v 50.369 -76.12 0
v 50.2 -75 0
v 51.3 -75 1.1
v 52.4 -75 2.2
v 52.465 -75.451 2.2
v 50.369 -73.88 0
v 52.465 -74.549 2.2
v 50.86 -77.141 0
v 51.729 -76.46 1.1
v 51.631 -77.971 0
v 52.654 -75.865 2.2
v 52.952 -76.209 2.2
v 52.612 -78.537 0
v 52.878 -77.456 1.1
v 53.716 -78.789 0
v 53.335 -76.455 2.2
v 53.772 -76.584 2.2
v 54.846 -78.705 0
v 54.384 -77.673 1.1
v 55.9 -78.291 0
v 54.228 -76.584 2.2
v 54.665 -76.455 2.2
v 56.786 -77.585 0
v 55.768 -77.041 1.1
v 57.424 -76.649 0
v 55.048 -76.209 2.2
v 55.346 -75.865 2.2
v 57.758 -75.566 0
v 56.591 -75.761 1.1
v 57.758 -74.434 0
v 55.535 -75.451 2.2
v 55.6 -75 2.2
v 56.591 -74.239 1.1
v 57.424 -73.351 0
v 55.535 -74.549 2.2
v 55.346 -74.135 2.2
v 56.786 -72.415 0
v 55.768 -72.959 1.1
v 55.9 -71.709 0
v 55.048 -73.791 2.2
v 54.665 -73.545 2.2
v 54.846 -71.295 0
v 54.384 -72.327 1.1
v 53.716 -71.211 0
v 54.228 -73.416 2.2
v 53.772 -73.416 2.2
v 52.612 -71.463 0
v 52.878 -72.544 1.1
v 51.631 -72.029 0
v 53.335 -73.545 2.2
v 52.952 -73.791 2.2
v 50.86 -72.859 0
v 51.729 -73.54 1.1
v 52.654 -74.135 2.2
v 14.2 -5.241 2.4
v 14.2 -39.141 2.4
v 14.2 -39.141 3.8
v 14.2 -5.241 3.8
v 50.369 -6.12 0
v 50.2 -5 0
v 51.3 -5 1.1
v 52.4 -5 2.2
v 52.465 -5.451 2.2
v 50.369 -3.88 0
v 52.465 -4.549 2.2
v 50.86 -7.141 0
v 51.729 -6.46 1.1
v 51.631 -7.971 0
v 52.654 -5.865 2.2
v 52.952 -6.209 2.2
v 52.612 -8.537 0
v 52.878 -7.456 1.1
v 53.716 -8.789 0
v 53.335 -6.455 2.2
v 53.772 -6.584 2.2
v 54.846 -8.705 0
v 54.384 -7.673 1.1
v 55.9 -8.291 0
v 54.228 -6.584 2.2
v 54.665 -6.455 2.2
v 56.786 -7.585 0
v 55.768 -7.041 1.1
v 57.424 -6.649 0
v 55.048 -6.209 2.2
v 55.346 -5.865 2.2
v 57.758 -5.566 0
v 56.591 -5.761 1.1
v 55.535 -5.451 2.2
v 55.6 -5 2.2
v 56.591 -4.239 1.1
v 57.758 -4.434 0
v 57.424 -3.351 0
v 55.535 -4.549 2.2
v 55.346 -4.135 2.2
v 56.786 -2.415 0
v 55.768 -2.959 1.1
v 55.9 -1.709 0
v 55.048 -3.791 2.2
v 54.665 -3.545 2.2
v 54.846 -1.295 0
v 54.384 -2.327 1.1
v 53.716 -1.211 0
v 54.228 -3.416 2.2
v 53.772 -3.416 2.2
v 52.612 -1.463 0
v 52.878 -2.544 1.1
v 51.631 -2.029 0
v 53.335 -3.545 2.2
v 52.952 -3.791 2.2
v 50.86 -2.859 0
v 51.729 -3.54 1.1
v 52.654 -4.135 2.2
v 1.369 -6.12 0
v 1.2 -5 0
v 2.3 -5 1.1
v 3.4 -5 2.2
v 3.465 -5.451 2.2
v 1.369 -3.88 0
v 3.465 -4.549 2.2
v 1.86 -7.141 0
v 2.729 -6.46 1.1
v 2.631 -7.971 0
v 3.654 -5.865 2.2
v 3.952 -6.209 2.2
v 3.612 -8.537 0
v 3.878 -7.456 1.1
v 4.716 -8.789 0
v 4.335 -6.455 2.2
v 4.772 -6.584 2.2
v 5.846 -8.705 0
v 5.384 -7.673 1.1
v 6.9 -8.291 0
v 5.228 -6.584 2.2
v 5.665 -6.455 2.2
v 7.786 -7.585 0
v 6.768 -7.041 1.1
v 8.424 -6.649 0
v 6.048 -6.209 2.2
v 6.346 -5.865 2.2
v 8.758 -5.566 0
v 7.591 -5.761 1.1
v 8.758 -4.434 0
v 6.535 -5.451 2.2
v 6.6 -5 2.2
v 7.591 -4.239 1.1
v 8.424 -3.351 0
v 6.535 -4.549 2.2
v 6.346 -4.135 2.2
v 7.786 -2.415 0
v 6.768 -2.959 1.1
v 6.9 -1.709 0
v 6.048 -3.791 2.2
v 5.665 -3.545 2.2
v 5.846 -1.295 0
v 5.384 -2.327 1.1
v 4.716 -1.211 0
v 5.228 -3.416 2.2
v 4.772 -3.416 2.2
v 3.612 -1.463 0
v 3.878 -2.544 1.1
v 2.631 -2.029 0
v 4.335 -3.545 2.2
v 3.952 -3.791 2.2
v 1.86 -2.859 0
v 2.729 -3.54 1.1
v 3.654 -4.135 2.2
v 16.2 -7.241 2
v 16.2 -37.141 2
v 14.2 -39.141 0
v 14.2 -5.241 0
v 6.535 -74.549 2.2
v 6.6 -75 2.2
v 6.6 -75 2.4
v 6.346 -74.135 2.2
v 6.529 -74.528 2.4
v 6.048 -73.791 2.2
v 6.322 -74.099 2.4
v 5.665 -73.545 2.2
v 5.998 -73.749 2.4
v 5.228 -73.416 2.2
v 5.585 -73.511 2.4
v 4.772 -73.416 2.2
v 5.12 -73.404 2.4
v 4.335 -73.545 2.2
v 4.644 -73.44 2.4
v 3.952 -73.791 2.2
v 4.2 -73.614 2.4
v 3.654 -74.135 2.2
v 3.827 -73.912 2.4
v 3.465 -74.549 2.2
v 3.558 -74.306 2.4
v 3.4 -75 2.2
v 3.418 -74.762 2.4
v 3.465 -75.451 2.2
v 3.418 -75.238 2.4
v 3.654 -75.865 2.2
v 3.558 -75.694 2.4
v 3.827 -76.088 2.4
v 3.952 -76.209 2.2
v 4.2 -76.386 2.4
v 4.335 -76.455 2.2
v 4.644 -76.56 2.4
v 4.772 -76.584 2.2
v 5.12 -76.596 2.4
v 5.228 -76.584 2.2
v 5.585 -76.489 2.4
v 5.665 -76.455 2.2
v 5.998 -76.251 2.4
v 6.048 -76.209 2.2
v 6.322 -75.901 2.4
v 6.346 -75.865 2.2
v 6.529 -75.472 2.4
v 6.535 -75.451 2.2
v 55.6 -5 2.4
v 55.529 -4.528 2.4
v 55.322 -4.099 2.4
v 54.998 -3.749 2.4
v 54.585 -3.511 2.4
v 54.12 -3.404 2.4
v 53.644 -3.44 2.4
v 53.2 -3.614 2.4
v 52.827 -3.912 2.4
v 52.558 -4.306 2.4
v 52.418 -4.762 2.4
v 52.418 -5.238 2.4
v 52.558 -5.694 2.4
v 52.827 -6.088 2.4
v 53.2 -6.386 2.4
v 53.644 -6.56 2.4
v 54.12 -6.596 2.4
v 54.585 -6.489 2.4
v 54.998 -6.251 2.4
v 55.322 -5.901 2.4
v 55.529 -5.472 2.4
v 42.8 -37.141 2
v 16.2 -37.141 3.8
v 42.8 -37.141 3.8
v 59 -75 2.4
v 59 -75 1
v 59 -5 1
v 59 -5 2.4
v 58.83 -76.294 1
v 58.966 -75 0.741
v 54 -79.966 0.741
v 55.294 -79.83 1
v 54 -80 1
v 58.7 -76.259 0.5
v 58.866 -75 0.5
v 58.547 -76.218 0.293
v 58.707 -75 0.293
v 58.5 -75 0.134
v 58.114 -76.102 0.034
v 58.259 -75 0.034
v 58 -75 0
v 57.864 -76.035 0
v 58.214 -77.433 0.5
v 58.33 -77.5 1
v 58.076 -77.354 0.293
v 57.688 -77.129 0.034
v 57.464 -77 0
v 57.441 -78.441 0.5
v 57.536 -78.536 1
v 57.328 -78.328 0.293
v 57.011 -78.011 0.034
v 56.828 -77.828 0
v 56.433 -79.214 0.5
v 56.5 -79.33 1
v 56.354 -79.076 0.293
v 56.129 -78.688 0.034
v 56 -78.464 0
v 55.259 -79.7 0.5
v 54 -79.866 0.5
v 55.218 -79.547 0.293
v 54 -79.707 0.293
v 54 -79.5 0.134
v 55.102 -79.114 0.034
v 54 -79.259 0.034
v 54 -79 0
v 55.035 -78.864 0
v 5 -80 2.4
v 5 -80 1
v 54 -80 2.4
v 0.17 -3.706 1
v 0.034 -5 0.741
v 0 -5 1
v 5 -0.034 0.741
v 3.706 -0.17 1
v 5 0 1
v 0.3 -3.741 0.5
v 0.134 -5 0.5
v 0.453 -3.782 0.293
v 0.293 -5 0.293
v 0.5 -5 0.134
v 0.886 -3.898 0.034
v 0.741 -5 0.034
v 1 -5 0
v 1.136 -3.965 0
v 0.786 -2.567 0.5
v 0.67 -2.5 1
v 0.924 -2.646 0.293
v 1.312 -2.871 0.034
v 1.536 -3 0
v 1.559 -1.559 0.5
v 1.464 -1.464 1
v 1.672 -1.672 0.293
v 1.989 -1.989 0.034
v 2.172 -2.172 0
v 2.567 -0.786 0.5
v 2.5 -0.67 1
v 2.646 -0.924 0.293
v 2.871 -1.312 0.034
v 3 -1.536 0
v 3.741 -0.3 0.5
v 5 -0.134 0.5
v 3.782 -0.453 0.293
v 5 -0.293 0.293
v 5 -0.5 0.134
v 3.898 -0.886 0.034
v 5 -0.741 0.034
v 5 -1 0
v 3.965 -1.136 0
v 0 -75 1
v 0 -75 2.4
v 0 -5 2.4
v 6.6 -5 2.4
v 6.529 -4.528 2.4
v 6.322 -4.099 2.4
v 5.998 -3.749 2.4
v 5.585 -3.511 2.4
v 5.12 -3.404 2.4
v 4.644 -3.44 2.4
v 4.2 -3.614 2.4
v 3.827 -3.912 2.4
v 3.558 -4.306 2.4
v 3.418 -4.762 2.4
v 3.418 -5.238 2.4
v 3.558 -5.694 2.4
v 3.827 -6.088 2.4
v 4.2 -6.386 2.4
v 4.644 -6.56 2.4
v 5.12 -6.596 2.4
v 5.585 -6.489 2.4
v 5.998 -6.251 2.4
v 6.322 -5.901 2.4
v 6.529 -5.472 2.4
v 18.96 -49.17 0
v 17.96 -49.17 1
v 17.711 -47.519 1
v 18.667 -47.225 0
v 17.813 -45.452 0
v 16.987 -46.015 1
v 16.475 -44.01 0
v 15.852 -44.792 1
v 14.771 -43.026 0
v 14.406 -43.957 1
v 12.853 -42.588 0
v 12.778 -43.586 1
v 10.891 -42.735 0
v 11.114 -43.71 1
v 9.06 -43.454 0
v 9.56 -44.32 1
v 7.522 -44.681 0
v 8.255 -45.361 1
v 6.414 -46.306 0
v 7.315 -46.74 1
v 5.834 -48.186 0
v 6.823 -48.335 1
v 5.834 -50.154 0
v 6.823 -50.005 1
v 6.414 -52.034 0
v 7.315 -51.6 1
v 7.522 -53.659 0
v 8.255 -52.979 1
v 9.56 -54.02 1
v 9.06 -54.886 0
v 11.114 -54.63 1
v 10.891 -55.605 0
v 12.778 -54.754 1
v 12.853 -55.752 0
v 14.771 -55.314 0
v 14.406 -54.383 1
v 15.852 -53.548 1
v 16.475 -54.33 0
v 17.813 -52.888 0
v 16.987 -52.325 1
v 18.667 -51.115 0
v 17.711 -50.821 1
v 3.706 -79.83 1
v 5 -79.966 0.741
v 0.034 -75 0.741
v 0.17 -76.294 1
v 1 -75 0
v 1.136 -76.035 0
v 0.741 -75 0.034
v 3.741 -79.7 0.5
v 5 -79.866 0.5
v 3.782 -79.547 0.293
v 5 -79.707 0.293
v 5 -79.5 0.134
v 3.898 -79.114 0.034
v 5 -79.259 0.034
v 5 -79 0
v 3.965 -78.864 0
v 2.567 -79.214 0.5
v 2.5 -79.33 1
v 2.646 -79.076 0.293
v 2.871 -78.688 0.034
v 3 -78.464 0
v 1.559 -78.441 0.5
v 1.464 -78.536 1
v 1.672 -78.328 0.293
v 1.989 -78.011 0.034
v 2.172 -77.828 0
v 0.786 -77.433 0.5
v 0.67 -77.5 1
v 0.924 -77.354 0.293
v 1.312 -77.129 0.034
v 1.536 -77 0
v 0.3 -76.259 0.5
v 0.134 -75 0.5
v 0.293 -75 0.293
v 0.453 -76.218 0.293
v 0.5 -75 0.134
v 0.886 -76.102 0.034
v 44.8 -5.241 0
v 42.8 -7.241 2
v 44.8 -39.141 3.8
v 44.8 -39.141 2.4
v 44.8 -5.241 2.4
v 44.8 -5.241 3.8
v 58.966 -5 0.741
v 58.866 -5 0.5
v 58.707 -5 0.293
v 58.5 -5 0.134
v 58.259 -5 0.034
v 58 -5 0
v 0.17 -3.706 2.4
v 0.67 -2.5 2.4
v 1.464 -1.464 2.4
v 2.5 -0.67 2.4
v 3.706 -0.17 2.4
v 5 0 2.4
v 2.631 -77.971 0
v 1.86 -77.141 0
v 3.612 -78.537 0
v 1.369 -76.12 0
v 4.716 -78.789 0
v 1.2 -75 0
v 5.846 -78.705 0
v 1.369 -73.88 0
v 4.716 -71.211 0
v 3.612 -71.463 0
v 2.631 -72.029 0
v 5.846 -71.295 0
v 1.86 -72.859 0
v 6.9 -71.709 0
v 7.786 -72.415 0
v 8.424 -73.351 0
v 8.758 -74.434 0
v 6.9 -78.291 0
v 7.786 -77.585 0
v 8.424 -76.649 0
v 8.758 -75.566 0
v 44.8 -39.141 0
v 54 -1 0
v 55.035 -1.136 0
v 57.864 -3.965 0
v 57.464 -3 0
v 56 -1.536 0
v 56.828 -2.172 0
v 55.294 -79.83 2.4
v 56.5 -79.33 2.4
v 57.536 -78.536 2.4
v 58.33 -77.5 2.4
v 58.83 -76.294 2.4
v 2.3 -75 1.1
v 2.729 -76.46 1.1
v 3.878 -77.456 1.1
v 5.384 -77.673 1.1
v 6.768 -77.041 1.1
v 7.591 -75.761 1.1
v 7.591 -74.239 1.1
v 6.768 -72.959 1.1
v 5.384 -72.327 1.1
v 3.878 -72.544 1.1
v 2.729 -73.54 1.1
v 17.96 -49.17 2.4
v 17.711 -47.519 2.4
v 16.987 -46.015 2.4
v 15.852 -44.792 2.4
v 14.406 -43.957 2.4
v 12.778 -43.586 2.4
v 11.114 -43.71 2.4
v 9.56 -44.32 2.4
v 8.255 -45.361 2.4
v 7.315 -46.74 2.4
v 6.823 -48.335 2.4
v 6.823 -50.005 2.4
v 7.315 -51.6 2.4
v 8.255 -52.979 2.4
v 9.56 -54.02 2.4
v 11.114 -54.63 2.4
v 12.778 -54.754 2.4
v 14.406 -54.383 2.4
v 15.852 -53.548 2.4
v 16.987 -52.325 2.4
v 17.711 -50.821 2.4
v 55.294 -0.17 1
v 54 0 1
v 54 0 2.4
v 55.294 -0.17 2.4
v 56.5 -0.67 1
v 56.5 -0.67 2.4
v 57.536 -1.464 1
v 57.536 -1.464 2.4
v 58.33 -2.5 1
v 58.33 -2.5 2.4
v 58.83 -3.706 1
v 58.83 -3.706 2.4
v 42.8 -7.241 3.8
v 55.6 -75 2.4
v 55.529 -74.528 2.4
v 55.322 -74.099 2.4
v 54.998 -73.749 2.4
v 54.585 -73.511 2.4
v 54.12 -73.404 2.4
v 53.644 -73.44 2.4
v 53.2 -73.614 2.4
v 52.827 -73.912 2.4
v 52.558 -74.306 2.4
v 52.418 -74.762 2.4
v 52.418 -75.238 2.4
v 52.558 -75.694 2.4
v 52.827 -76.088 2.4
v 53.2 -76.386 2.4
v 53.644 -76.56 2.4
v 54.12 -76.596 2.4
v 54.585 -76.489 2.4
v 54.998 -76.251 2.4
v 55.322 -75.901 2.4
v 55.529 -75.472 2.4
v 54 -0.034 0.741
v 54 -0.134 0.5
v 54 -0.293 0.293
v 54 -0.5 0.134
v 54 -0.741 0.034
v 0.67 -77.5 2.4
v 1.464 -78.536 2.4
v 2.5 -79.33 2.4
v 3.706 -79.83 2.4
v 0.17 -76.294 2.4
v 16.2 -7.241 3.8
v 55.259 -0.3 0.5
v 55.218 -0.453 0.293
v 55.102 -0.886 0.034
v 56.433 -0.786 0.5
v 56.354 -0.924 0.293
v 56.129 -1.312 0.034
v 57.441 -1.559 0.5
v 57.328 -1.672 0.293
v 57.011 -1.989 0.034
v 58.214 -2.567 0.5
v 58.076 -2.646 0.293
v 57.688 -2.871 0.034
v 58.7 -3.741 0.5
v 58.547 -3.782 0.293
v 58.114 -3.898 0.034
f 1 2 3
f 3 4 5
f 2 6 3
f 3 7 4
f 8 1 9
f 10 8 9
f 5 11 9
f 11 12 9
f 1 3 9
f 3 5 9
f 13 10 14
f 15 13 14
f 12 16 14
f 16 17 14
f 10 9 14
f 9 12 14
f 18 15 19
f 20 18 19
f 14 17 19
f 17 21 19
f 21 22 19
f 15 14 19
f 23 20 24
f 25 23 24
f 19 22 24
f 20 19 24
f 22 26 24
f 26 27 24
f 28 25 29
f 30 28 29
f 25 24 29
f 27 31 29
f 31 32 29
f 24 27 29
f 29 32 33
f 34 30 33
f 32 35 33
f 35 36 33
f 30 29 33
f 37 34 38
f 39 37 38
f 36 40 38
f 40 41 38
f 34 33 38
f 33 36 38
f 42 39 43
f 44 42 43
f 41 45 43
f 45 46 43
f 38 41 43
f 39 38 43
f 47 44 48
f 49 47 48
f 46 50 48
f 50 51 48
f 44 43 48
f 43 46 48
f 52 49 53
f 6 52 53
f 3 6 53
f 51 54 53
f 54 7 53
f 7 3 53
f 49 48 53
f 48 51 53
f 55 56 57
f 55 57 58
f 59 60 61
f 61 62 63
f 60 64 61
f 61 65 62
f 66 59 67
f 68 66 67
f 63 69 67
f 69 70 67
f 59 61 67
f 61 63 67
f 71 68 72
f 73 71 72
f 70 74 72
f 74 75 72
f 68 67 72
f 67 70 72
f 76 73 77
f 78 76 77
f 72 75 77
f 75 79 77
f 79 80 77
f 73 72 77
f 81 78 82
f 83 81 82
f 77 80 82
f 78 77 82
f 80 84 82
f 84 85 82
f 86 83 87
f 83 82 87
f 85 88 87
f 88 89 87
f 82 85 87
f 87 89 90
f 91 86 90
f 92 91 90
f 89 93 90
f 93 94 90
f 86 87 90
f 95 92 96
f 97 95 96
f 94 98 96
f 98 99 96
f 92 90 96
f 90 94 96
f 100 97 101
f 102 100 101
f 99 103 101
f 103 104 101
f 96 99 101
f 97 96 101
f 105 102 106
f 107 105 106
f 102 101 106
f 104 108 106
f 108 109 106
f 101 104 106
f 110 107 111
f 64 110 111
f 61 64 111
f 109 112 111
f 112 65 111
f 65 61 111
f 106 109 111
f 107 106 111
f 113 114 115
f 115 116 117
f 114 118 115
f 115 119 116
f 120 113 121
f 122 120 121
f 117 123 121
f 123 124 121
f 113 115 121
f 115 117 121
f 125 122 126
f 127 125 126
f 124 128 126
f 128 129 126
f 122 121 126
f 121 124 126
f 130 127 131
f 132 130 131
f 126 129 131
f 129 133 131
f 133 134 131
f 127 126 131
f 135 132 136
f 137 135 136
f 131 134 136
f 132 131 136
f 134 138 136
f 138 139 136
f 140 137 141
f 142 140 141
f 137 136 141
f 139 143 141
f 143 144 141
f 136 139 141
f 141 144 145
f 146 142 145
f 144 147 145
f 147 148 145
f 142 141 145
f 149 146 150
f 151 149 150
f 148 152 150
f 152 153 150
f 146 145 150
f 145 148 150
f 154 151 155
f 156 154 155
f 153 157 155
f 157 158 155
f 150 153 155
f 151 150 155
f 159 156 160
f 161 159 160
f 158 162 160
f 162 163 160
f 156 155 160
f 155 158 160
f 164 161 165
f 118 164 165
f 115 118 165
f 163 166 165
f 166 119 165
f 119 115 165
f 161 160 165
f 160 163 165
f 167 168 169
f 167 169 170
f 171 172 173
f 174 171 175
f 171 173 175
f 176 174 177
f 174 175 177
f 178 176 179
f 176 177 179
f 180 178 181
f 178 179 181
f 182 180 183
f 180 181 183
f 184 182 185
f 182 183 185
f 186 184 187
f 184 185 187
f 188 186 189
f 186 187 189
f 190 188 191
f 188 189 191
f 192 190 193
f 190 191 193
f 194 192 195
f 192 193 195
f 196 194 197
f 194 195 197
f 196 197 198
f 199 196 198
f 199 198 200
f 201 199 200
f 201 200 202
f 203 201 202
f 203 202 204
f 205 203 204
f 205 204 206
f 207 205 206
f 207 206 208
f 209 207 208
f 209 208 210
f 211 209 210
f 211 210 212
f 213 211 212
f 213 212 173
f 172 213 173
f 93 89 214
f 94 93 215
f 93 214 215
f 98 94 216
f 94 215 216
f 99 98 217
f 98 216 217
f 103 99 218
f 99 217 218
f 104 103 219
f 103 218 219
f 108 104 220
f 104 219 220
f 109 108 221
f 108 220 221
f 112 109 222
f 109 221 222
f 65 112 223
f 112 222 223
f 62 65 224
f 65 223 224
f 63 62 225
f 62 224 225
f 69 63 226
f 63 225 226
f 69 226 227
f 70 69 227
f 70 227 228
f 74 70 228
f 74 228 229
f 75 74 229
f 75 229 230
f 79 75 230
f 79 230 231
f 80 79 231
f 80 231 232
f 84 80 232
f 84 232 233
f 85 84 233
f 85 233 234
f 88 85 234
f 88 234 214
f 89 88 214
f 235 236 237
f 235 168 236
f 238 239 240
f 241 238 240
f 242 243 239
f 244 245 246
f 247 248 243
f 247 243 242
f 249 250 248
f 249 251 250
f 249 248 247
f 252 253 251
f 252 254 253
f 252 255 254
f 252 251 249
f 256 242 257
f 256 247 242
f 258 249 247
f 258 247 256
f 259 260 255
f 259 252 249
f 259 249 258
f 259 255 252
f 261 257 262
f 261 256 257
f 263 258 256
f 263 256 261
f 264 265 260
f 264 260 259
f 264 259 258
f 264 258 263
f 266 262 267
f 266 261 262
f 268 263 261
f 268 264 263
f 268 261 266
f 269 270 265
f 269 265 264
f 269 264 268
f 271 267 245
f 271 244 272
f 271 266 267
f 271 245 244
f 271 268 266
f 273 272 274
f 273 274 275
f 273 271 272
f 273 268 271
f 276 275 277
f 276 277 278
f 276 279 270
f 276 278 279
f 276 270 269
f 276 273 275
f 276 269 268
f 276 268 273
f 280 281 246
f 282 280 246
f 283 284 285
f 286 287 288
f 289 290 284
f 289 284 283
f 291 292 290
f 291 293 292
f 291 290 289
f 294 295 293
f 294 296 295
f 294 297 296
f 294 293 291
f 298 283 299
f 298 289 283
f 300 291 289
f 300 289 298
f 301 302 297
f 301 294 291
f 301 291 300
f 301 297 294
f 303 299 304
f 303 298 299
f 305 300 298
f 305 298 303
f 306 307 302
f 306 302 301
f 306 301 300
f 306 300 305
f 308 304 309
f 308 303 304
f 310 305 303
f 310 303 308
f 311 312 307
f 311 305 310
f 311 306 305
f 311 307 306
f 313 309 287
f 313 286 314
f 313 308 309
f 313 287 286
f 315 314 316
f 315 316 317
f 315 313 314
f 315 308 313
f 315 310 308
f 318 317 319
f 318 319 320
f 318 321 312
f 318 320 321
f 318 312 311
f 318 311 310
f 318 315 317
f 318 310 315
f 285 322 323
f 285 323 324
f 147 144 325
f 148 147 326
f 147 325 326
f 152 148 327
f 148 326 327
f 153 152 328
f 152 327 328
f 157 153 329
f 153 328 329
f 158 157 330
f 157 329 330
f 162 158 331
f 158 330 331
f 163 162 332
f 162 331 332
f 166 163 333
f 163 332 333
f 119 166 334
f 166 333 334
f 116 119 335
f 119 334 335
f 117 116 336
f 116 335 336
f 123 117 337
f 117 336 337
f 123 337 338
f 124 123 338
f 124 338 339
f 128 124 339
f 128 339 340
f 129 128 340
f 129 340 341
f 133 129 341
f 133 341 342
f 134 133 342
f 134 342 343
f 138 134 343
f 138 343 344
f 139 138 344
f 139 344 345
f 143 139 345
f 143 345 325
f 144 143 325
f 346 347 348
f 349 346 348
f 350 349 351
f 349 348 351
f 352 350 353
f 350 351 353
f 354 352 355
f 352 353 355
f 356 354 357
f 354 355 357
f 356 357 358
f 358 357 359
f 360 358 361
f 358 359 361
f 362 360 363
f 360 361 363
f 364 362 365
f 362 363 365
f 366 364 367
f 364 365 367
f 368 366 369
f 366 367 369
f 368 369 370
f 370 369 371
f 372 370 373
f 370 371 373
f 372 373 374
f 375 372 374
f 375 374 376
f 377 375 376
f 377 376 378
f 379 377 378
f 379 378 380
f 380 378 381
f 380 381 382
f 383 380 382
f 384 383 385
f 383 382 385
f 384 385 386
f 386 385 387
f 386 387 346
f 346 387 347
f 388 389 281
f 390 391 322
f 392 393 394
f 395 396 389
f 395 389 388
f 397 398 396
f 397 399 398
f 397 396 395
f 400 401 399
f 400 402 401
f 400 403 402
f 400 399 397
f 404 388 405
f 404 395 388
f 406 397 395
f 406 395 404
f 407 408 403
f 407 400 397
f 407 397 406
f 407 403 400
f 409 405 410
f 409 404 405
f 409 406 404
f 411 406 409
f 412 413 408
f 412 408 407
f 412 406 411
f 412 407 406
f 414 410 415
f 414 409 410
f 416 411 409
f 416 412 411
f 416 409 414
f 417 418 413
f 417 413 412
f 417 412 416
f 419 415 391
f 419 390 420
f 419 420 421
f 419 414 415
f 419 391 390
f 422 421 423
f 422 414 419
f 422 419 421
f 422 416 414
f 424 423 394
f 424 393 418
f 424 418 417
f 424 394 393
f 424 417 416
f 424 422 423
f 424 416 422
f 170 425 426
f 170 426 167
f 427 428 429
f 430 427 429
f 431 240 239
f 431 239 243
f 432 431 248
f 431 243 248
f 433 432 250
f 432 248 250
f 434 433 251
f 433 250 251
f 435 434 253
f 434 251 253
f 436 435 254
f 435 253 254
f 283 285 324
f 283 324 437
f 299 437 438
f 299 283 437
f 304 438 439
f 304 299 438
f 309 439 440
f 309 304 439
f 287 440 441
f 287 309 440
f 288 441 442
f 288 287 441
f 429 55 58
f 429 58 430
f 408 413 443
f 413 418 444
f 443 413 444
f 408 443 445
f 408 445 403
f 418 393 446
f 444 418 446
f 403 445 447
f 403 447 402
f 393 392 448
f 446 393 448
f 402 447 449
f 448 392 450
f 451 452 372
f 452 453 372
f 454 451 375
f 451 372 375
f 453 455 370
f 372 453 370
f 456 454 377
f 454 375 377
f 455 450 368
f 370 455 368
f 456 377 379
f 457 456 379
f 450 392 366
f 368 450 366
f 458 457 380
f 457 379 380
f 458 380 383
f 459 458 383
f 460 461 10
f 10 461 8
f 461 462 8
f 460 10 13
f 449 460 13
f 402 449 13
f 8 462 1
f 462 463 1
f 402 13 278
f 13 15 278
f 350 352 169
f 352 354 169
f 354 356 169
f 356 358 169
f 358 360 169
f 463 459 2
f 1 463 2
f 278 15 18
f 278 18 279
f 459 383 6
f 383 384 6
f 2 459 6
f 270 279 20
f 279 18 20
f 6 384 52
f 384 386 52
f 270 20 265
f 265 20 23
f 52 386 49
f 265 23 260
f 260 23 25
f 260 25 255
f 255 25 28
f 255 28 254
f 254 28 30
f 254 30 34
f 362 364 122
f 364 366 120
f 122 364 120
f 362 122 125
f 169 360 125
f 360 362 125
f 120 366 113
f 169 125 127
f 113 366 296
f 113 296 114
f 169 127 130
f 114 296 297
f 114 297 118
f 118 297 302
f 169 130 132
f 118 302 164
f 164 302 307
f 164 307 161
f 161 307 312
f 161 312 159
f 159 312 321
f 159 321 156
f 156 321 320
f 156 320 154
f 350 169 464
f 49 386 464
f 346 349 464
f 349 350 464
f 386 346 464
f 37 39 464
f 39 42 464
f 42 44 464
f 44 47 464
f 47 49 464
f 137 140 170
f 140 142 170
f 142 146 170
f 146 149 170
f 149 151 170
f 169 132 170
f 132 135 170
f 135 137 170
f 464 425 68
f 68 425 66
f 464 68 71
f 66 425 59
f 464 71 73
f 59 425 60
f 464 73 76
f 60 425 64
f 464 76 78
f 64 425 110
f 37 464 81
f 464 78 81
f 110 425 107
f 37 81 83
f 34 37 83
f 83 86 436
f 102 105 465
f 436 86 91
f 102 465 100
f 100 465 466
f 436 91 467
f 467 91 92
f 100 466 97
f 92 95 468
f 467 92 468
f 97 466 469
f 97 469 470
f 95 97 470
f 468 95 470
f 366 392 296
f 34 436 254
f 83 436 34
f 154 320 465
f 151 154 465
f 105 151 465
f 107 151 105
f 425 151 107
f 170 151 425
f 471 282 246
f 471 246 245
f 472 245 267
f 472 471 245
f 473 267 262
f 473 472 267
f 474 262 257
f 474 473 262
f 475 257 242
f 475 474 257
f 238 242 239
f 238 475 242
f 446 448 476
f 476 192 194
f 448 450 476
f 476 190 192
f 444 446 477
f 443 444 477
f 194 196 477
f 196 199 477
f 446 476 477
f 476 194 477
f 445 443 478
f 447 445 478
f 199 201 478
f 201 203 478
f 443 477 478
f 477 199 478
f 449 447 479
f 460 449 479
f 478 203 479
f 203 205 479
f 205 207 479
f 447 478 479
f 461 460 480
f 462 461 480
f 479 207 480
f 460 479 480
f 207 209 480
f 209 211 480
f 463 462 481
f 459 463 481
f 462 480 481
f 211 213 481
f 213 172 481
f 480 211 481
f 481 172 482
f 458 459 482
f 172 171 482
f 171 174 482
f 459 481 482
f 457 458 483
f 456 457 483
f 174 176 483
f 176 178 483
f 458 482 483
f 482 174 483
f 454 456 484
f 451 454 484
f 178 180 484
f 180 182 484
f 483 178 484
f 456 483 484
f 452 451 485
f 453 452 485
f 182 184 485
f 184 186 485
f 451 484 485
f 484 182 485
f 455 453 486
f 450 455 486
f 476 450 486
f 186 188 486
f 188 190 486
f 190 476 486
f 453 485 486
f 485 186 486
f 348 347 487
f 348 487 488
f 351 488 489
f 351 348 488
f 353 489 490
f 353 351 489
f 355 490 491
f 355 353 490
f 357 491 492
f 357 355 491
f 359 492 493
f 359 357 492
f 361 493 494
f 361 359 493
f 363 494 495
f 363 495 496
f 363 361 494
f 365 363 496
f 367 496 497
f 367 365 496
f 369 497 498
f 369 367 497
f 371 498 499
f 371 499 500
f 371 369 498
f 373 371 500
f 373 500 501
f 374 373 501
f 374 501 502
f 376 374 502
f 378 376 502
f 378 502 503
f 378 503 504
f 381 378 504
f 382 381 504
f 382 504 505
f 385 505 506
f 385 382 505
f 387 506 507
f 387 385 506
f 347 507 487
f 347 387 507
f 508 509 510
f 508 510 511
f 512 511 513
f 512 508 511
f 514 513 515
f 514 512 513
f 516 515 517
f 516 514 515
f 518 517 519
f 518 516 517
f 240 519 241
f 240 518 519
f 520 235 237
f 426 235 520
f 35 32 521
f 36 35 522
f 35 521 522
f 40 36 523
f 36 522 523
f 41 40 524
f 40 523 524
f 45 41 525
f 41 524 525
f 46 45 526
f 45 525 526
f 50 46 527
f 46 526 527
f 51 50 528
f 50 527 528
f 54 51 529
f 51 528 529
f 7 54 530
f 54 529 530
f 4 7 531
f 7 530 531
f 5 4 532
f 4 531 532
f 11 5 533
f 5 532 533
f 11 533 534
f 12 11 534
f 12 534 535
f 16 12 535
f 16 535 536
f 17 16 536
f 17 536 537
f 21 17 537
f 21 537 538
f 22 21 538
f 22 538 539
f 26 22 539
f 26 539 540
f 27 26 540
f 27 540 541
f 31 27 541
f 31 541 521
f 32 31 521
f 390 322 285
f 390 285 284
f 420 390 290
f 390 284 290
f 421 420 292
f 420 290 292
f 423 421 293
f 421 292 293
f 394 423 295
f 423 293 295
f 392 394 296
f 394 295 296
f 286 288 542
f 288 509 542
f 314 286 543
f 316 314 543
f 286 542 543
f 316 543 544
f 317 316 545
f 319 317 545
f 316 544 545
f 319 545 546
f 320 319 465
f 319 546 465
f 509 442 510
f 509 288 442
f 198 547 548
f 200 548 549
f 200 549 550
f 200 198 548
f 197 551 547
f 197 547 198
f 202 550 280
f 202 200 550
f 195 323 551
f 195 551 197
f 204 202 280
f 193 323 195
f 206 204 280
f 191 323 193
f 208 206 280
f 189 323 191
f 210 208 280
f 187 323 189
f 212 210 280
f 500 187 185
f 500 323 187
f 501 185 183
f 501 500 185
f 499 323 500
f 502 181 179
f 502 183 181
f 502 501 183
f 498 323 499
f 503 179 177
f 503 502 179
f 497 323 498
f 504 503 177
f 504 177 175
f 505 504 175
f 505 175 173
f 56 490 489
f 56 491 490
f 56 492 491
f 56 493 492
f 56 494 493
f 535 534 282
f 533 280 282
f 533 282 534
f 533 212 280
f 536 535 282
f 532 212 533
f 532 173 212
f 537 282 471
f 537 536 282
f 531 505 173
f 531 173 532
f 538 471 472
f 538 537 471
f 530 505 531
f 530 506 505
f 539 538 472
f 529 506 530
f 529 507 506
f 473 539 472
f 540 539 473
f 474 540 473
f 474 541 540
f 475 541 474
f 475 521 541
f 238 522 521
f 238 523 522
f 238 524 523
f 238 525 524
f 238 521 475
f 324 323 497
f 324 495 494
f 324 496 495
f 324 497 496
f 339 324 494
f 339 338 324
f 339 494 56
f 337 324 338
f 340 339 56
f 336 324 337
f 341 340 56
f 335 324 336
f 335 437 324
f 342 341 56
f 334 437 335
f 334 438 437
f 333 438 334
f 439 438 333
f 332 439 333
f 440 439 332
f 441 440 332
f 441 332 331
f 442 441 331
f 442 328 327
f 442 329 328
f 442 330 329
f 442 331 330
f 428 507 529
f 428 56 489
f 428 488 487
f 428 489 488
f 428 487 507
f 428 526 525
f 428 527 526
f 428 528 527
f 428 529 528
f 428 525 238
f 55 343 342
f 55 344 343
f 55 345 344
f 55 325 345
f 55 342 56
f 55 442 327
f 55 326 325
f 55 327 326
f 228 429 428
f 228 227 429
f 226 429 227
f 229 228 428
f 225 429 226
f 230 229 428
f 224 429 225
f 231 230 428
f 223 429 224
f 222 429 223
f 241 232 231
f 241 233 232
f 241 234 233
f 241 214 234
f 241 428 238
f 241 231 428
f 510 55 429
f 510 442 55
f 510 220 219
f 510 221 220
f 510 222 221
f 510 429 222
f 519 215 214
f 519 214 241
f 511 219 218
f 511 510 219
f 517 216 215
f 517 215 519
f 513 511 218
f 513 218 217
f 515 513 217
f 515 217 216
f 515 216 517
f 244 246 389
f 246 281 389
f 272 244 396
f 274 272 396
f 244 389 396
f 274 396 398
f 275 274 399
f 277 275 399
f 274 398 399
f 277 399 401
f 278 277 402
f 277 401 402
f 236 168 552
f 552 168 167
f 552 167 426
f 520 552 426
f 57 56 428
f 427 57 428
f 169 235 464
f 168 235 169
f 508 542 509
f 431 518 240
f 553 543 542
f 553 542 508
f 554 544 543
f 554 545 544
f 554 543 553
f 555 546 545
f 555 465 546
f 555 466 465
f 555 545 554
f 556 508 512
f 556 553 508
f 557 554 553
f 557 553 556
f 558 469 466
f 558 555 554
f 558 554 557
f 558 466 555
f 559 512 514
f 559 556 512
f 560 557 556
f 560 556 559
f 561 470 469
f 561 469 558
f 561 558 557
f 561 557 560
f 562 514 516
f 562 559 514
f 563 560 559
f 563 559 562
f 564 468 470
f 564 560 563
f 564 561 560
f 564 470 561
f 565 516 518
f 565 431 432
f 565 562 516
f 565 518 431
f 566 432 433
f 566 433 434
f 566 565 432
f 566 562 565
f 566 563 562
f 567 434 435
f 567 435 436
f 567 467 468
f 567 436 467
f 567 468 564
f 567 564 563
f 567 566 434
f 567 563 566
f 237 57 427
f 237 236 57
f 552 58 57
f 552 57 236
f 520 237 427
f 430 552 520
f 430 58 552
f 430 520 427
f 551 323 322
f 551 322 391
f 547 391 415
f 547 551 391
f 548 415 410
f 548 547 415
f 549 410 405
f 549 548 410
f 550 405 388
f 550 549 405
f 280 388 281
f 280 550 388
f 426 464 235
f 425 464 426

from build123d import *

# Parameters (mm, degrees)
SKETCH_1_W           = 59
SKETCH_1_H           = 80
SKETCH_1_R           = 5.6
EXTRUDE_1_DEPTH      = 2.4
SKETCH_4_W           = 59
SKETCH_4_H           = 80
EXTRUDE_6_DEPTH      = 5.5
FILLET_1_R           = 5
FILLET_2_R           = 5
SKETCH_14_R          = 3
SKETCH_14_R_2        = 1.3
EXTRUDE_7_DEPTH      = 6.5
EXTRUDE_10_DEPTH     = 1
FILLET_3_R           = 1
CUT_EXTRUDE_1_DEPTH  = 10
SKETCH_23_W          = 26.6
SKETCH_23_H          = 29.9
CUT_EXTRUDE_4_DEPTH  = 52
SKETCH_24_W          = 26.6
SKETCH_24_H          = 5
EXTRUDE_11_DEPTH     = 0.2
SKETCH_25_W          = 26.6
SKETCH_25_H          = 5
EXTRUDE_12_DEPTH     = 0.2
SKETCH_26_R          = 3.14740537
SKETCH_26_R_2        = 1.3
EXTRUDE_13_DEPTH     = 6.5
CUT_EXTRUDE_5_DEPTH  = 0.6
CHAMFER_1_SIZE       = 2
CHAMFER_2_SIZE       = 1
EXTRUDE_16_DEPTH     = 6.5
EXTRUDE_16_2_DEPTH   = 6.5
EXTRUDE_16_3_DEPTH   = 6.5
EXTRUDE_16_4_DEPTH   = 6.5
EXTRUDE_16_5_DEPTH   = 6.5
EXTRUDE_16_6_DEPTH   = 6.5
EXTRUDE_17_REACH     = 101.616
SKETCH_34_R          = 1.3
CUT_EXTRUDE_7_DEPTH  = 10
SKETCH_33_W          = 70.771509838
SKETCH_33_H          = 90.701063175
CUT_EXTRUDE_6_DEPTH  = 10
CHAMFER_3_SIZE       = 2.5
SKETCH_35_W          = 30.6
SKETCH_35_H          = 33.9
SKETCH_35_W_2        = 26.6
SKETCH_35_H_2        = 29.9
EXTRUDE_18_DEPTH     = 1.4
SKETCH_37_R          = 1.6
CUT_EXTRUDE_11_DEPTH = 11.4


with BuildPart() as part:
    # Эскиз1 → Бобышка-Вытянуть1 (new body)
    with BuildSketch(Plane.XY):
        with Locations((29.5, -40)):
            Rectangle(SKETCH_1_W, SKETCH_1_H)
        with Locations((12.36, -49.17)):
            Circle(SKETCH_1_R, mode=Mode.SUBTRACT)
    extrude(amount=EXTRUDE_1_DEPTH)

    # Эскиз4 → Бобышка-Вытянуть6 (add)
    with BuildSketch(Plane.XY.offset(2.4)):
        with Locations((29.5, -40)):
            Rectangle(SKETCH_4_W, SKETCH_4_H)
        with BuildLine():
            Line((5.1, -2), (53.9, -2))
            ThreePointArc((53.9, -2), (56.092031022, -2.907968978), (57, -5.1))
            Line((57, -5.1), (57, -74.9))
            ThreePointArc((57, -74.9), (56.092031022, -77.092031022), (53.9, -78))
            Line((53.9, -78), (5.1, -78))
            ThreePointArc((5.1, -78), (2.907968978, -77.092031022), (2, -74.9))
            Line((2, -74.9), (2, -5.1))
            ThreePointArc((2, -5.1), (2.907968978, -2.907968978), (5.1, -2))
        make_face(mode=Mode.SUBTRACT)
    extrude(amount=EXTRUDE_6_DEPTH)

    # Скругление1
    fillet_1_edges = [part.edges().sort_by_distance(p)[0] for p in [
        (0, 0, 3.95),
    ]]
    fillet(fillet_1_edges, radius=FILLET_1_R)

    # Скругление2
    fillet_2_edges = [part.edges().sort_by_distance(p)[0] for p in [
        (59, 0, 3.95),
        (59, -80, 3.95),
        (0, -80, 3.95),
    ]]
    fillet(fillet_2_edges, radius=FILLET_2_R)

    # Эскиз14 → Бобышка-Вытянуть7 (add)
    # profile 1 of 4: a face of its own
    with BuildSketch(Plane.XY.offset(2.4)):
        with Locations(Location((5, -5, 0), (0, 0, 180.947144451))):
            Circle(SKETCH_14_R)
        with Locations(Location((5, -5, 0), (0, 0, 180))):
            Circle(SKETCH_14_R_2, mode=Mode.SUBTRACT)
    # profile 2 of 4: a face of its own
    with BuildSketch(Plane.XY.offset(2.4)):
        with Locations(Location((5, -75, 0), (0, 0, 179.052855549))):
            Circle(SKETCH_14_R)
        with Locations(Location((5, -75, 0), (0, 0, 180))):
            Circle(SKETCH_14_R_2, mode=Mode.SUBTRACT)
    # profile 3 of 4: a face of its own
    with BuildSketch(Plane.XY.offset(2.4)):
        with Locations(Location((54, -75, 0), (0, 0, 269.052855549))):
            Circle(SKETCH_14_R)
        with Locations(Location((54, -75, 0), (0, 0, 180))):
            Circle(SKETCH_14_R_2, mode=Mode.SUBTRACT)
    # profile 4 of 4: a face of its own
    with BuildSketch(Plane.XY.offset(2.4)):
        with Locations(Location((54, -5, 0), (0, 0, 90.947144451))):
            Circle(SKETCH_14_R)
        with Locations(Location((54, -5, 0), (0, 0, 180))):
            Circle(SKETCH_14_R_2, mode=Mode.SUBTRACT)
    extrude(amount=EXTRUDE_7_DEPTH)

    # Скругление3
    fillet_3_edges = [part.edges().sort_by_distance(p)[0] for p in [
        (0, -40, 0),
        (1.464466094, -1.464466094, 0),
        (29.5, -80, 0),
        (29.5, 0, 0),
        (59, -40, 0),
        (57.535533906, -1.464466094, 0),
        (57.535533906, -78.535533906, 0),
        (1.464466094, -78.535533906, 0),
    ]]
    fillet(fillet_3_edges, radius=FILLET_3_R)


with BuildPart() as body_2:
    # Эскиз15 → Бобышка-Вытянуть10 (new body)
    with BuildSketch(Plane.XY.offset(7.9)):
        with BuildLine():
            Line((5, 0), (54, 0))
            ThreePointArc((54, 0), (57.535533906, -1.464466094), (59, -5))
            Line((59, -5), (59, -75))
            ThreePointArc((59, -75), (57.535533906, -78.535533906), (54, -80))
            Line((54, -80), (5, -80))
            ThreePointArc((5, -80), (1.464466094, -78.535533906), (0, -75))
            Line((0, -75), (0, -5))
            ThreePointArc((0, -5), (1.464466094, -1.464466094), (5, 0))
        make_face()
        with BuildLine():
            Line((5, -1), (54, -1))
            ThreePointArc((54, -1), (56.828427125, -2.171572875), (58, -5))
            Line((58, -5), (58, -75))
            ThreePointArc((58, -75), (56.828427125, -77.828427125), (54, -79))
            Line((54, -79), (5, -79))
            ThreePointArc((5, -79), (2.171572875, -77.828427125), (1, -75))
            Line((1, -75), (1, -5))
            ThreePointArc((1, -5), (2.171572875, -2.171572875), (5, -1))
        make_face(mode=Mode.SUBTRACT)
    extrude(amount=EXTRUDE_10_DEPTH)


with BuildPart() as cut_extrude_1_tool:
    # Эскиз20 → Вырез-Вытянуть1 (new body)
    with BuildSketch(Plane(origin=(59, 0, 0), x_dir=(0, 0, -1), z_dir=(1, 0, 0))):
        with BuildLine():
            Line((-8.9, -11.15), (-5.2, -11.15))
            ThreePointArc((-5.2, -11.15), (-4.492893219, -11.442893219), (-4.2, -12.15))
            Line((-4.2, -12.15), (-4.2, -18.25))
            ThreePointArc((-4.2, -18.25), (-4.492893219, -18.957106781), (-5.2, -19.25))
            Line((-5.2, -19.25), (-8.9, -19.25))
            Line((-8.9, -19.25), (-8.9, -11.15))
        make_face()
    extrude(amount=-CUT_EXTRUDE_1_DEPTH)


with BuildPart() as part_1:
    add(part.part)

    # Вырез-Вытянуть1: cut by cut_extrude_1_tool
    add(cut_extrude_1_tool.part, mode=Mode.SUBTRACT)

    # Эскиз23 → Вырез-Вытянуть4 (cut)
    with BuildSketch(Plane(origin=(0, 0, 0), x_dir=(-1, 0, 0), z_dir=(0, 0, -1))):
        with Locations((-29.500023272, -22.190991649)):
            Rectangle(SKETCH_23_W, SKETCH_23_H)
    extrude(amount=-CUT_EXTRUDE_4_DEPTH, mode=Mode.SUBTRACT)

    # Эскиз24 → Бобышка-Вытянуть11 (add)
    with BuildSketch(Plane.XY.offset(2.4)):
        with Locations((29.500023272, -4.740991649)):
            Rectangle(SKETCH_24_W, SKETCH_24_H)
    extrude(amount=EXTRUDE_11_DEPTH)

    # Эскиз25 → Бобышка-Вытянуть12 (add)
    with BuildSketch(Plane.XY.offset(2.4)):
        with Locations((29.500023272, -39.640991649)):
            Rectangle(SKETCH_25_W, SKETCH_25_H)
    extrude(amount=EXTRUDE_12_DEPTH)


with BuildPart() as body_2_1:
    add(body_2.part)

    # Вырез-Вытянуть1: cut by cut_extrude_1_tool
    add(cut_extrude_1_tool.part, mode=Mode.SUBTRACT)


    add(part_1.part)  # Бобышка-Вытянуть13 merges part
    # Эскиз26 → Бобышка-Вытянуть13 (add)
    with BuildSketch(Plane.XY.offset(2.4)):
        with Locations(Location((46.9, -5.7, 0), (0, 0, 180))):
            Circle(SKETCH_26_R)
        with Locations(Location((46.9, -5.7, 0), (0, 0, 180))):
            Circle(SKETCH_26_R_2, mode=Mode.SUBTRACT)
    extrude(amount=EXTRUDE_13_DEPTH)

    # Эскиз27 → Вырез-Вытянуть5 (cut)
    with BuildSketch(Plane.XY.offset(7.9)):
        with BuildLine():
            Line((58, -75), (58, -19.25))
            Line((58, -19.25), (57, -19.25))
            Line((57, -19.25), (57, -74.9))
            ThreePointArc((57, -74.9), (56.999897526, -74.925205779), (56.999590109, -74.950409891))
            ThreePointArc((56.999590109, -74.950409891), (56.121320344, -77.121320344), (53.950409891, -77.999590109))
            ThreePointArc((53.950409891, -77.999590109), (53.925205779, -77.999897526), (53.9, -78))
            Line((53.9, -78), (5.1, -78))
            ThreePointArc((5.1, -78), (5.074794221, -77.999897526), (5.049590109, -77.999590109))
            ThreePointArc((5.049590109, -77.999590109), (2.878679656, -77.121320344), (2.000409891, -74.950409891))
            ThreePointArc((2.000409891, -74.950409891), (2.000102474, -74.925205779), (2, -74.9))
            Line((2, -74.9), (2, -5.1))
            ThreePointArc((2, -5.1), (2.000102474, -5.074794221), (2.000409891, -5.049590109))
            ThreePointArc((2.000409891, -5.049590109), (2.878679656, -2.878679656), (5.049590109, -2.000409891))
            ThreePointArc((5.049590109, -2.000409891), (5.074794221, -2.000102474), (5.1, -2))
            Line((5.1, -2), (53.9, -2))
            ThreePointArc((53.9, -2), (53.925205779, -2.000102474), (53.950409891, -2.000409891))
            ThreePointArc((53.950409891, -2.000409891), (56.121320344, -2.878679656), (56.999590109, -5.049590109))
            ThreePointArc((56.999590109, -5.049590109), (56.999897526, -5.074794221), (57, -5.1))
            Line((57, -5.1), (57, -11.15))
            Line((57, -11.15), (58, -11.15))
            Line((58, -11.15), (58, -5))
            ThreePointArc((58, -5), (56.828427125, -2.171572875), (54, -1))
            Line((54, -1), (5, -1))
            ThreePointArc((5, -1), (2.171572875, -2.171572875), (1, -5))
            Line((1, -5), (1, -75))
            ThreePointArc((1, -75), (2.171572875, -77.828427125), (5, -79))
            Line((5, -79), (54, -79))
            ThreePointArc((54, -79), (56.828427125, -77.828427125), (58, -75))
        make_face()
    extrude(amount=-CUT_EXTRUDE_5_DEPTH, mode=Mode.SUBTRACT)

    # Фаска1
    chamfer_1_edges = [body_2_1.edges().sort_by_distance(p)[0] for p in [
        (16.200023272, -22.190991649, 0),
        (29.500023272, -37.140991649, 0),
        (42.800023272, -22.190991649, 0),
        (29.500023272, -7.240991649, 0),
    ]]
    chamfer(chamfer_1_edges, length=CHAMFER_1_SIZE)

    # Фаска2
    chamfer_2_edges = [body_2_1.edges().sort_by_distance(p)[0] for p in [
        (6.76, -49.17, 0),
    ]]
    chamfer(chamfer_2_edges, length=CHAMFER_2_SIZE)

    # Бобышка-Вытянуть17: up to this face of the body (flat: up to its plane)
    extrude_17_end = Plane(body_2_1.part.faces().sort_by_distance((49.958383303, -5.7, 8.9))[0])
    # Эскиз31 → Бобышка-Вытянуть17 (add, up to the picked face)
    with BuildSketch(Plane.XY.offset(2.4), mode=Mode.PRIVATE) as extrude_17_sk1:
        Polygon((5, -2), (8, -2), (8, -5), align=None)
    extrude_17_tool1 = split(extrude(extrude_17_sk1.sketch, amount=EXTRUDE_17_REACH, mode=Mode.PRIVATE), bisect_by=extrude_17_end, keep=Keep.BOTH, mode=Mode.PRIVATE)
    # Эскиз31 → Бобышка-Вытянуть17 (add, up to the picked face)
    with BuildSketch(Plane.XY.offset(2.4), mode=Mode.PRIVATE) as extrude_17_sk2:
        Polygon((5, -8), (2, -8), (2, -5.1), align=None)
    extrude_17_tool2 = split(extrude(extrude_17_sk2.sketch, amount=EXTRUDE_17_REACH, mode=Mode.PRIVATE), bisect_by=extrude_17_end, keep=Keep.BOTH, mode=Mode.PRIVATE)
    # Эскиз31 → Бобышка-Вытянуть17 (add, up to the picked face)
    with BuildSketch(Plane.XY.offset(2.4), mode=Mode.PRIVATE) as extrude_17_sk3:
        Polygon((50.04740537, -5.7), (50.04740537, -2), (43.75259463, -2), (43.753891914, -5.790357503), (46.9, -2.55259463), align=None)
    extrude_17_tool3 = split(extrude(extrude_17_sk3.sketch, amount=EXTRUDE_17_REACH, mode=Mode.PRIVATE), bisect_by=extrude_17_end, keep=Keep.BOTH, mode=Mode.PRIVATE)
    # Эскиз31 → Бобышка-Вытянуть17 (add, up to the picked face)
    with BuildSketch(Plane.XY.offset(2.4), mode=Mode.PRIVATE) as extrude_17_sk4:
        Polygon((57, -5), (54, -8), (57, -8), align=None)
    extrude_17_tool4 = split(extrude(extrude_17_sk4.sketch, amount=EXTRUDE_17_REACH, mode=Mode.PRIVATE), bisect_by=extrude_17_end, keep=Keep.BOTH, mode=Mode.PRIVATE)
    # Эскиз31 → Бобышка-Вытянуть17 (add, up to the picked face)
    with BuildSketch(Plane.XY.offset(2.4), mode=Mode.PRIVATE) as extrude_17_sk5:
        Polygon((54, -2), (51, -2), (51, -5), align=None)
    extrude_17_tool5 = split(extrude(extrude_17_sk5.sketch, amount=EXTRUDE_17_REACH, mode=Mode.PRIVATE), bisect_by=extrude_17_end, keep=Keep.BOTH, mode=Mode.PRIVATE)
    add(extrude_17_tool1.solids().sort_by(Axis((7, -3, 2.4), (0, 0, 1)))[0])
    add(extrude_17_tool2.solids().sort_by(Axis((3, -7.033333, 2.4), (0, 0, 1)))[0])
    add(extrude_17_tool3.solids().sort_by(Axis((49.973926, -3.85, 2.4), (0, 0, 1)))[0])
    add(extrude_17_tool4.solids().sort_by(Axis((56, -7, 2.4), (0, 0, 1)))[0])
    add(extrude_17_tool5.solids().sort_by(Axis((52, -3, 2.4), (0, 0, 1)))[0])

    # Эскиз34 → Вырез-Вытянуть7 (cut)
    with BuildSketch(Plane.XY.offset(8.9)):
        with Locations(Location((5, -75, 0), (0, 0, 180))):
            Circle(SKETCH_34_R)
        with Locations(Location((54, -75, 0), (0, 0, 180))):
            Circle(SKETCH_34_R)
        with Locations(Location((54, -5, 0), (0, 0, 180))):
            Circle(SKETCH_34_R)
        with Locations(Location((5, -5, 0), (0, 0, 180))):
            Circle(SKETCH_34_R)
    extrude(amount=-CUT_EXTRUDE_7_DEPTH, mode=Mode.SUBTRACT)


with BuildPart() as body_2_2:
    # Эскиз30 → Бобышка-Вытянуть16 (new body)
    with BuildSketch(Plane.XY.offset(2.4)):
        with BuildLine():
            Line((5.049590109, -77.999590109), (8, -78))
            Line((8, -78), (8, -75))
            ThreePointArc((8, -75), (7.138781233, -77.103714533), (5.049590109, -77.999590109))
        make_face()
    extrude(amount=EXTRUDE_16_DEPTH)


with BuildPart() as body_3:
    # Эскиз30 → Extrude 16 2 (new body)
    with BuildSketch(Plane.XY.offset(2.4)):
        with BuildLine():
            ThreePointArc((5, -72), (7.121320344, -72.878679656), (8, -75))
            Line((8, -75), (8, -72))
            Line((8, -72), (5, -72))
        make_face()
    extrude(amount=EXTRUDE_16_2_DEPTH)


with BuildPart() as body_4:
    # Эскиз30 → Extrude 16 3 (new body)
    with BuildSketch(Plane.XY.offset(2.4)):
        with BuildLine():
            ThreePointArc((2.000409891, -74.950409891), (2.896285467, -72.861218767), (5, -72))
            Line((5, -72), (2, -72))
            Line((2, -72), (2.000409891, -74.950409891))
        make_face()
    extrude(amount=EXTRUDE_16_3_DEPTH)


with BuildPart() as body_5:
    # Эскиз30 → Extrude 16 4 (new body)
    with BuildSketch(Plane.XY.offset(2.4)):
        with BuildLine():
            Line((57, -72), (54, -72))
            ThreePointArc((54, -72), (56.103714533, -72.861218767), (56.999590109, -74.950409891))
            ThreePointArc((56.999590109, -74.950409891), (56.999897526, -74.925205779), (57, -74.9))
            Line((57, -74.9), (57, -72))
        make_face()
    extrude(amount=EXTRUDE_16_4_DEPTH)


with BuildPart() as body_6:
    # Эскиз30 → Extrude 16 5 (new body)
    with BuildSketch(Plane.XY.offset(2.4)):
        with BuildLine():
            ThreePointArc((51, -75), (51.878679656, -72.878679656), (54, -72))
            Line((54, -72), (51, -72))
            Line((51, -72), (51, -75))
        make_face()
    extrude(amount=EXTRUDE_16_5_DEPTH)


with BuildPart() as body_7:
    # Эскиз30 → Extrude 16 6 (new body)
    with BuildSketch(Plane.XY.offset(2.4)):
        with BuildLine():
            ThreePointArc((53.950409891, -77.999590109), (51.861218767, -77.103714533), (51, -75))
            Line((51, -75), (51, -78))
            Line((51, -78), (53.9, -78))
            ThreePointArc((53.9, -78), (53.925205779, -77.999897526), (53.950409891, -77.999590109))
        make_face()
    extrude(amount=EXTRUDE_16_6_DEPTH)


with BuildPart() as cut_extrude_6_tool:
    # Эскиз33 → Вырез-Вытянуть6 (new body)
    with BuildSketch(Plane.XY.offset(2.4)):
        with Locations((30.732946322, -41.484926606)):
            Rectangle(SKETCH_33_W, SKETCH_33_H)
    extrude(amount=CUT_EXTRUDE_6_DEPTH)


with BuildPart() as body_2_3:
    add(body_2_1.part)

    # Вырез-Вытянуть6: cut by cut_extrude_6_tool
    add(cut_extrude_6_tool.part, mode=Mode.SUBTRACT)

    # Фаска3
    # the kernel refuses this chamfer: 2.5 mm, written as the material it takes off along each edge
    with BuildSketch(Plane(origin=(5, -5, 0), x_dir=(-1, 0, 0), z_dir=(0, 1, 0))) as chamfer_3_piece_1:
        Polygon((1.3 + CHAMFER_3_SIZE, 0), (1.3, CHAMFER_3_SIZE), (1.3, 0), align=None)
    revolve(axis=Axis((5, -5, 0), (0, 0, 1)), mode=Mode.SUBTRACT)
    with BuildSketch(Plane(origin=(5, -75, 0), x_dir=(-1, 0, 0), z_dir=(0, 1, 0))) as chamfer_3_piece_2:
        Polygon((1.3 + CHAMFER_3_SIZE, 0), (1.3, CHAMFER_3_SIZE), (1.3, 0), align=None)
    revolve(axis=Axis((5, -75, 0), (0, 0, 1)), mode=Mode.SUBTRACT)
    with BuildSketch(Plane(origin=(54, -75, 0), x_dir=(-1, 0, 0), z_dir=(0, 1, 0))) as chamfer_3_piece_3:
        Polygon((1.3 + CHAMFER_3_SIZE, 0), (1.3, CHAMFER_3_SIZE), (1.3, 0), align=None)
    revolve(axis=Axis((54, -75, 0), (0, 0, 1)), mode=Mode.SUBTRACT)
    with BuildSketch(Plane(origin=(54, -5, 0), x_dir=(-1, 0, 0), z_dir=(0, 1, 0))) as chamfer_3_piece_4:
        Polygon((1.3 + CHAMFER_3_SIZE, 0), (1.3, CHAMFER_3_SIZE), (1.3, 0), align=None)
    revolve(axis=Axis((54, -5, 0), (0, 0, 1)), mode=Mode.SUBTRACT)

    # Эскиз35 → Бобышка-Вытянуть18 (add)
    with BuildSketch(Plane.XY.offset(2.4)):
        with Locations((29.500023272, -22.190991649)):
            Rectangle(SKETCH_35_W, SKETCH_35_H)
        with Locations((29.500023272, -22.190991649)):
            Rectangle(SKETCH_35_W_2, SKETCH_35_H_2, mode=Mode.SUBTRACT)
    extrude(amount=EXTRUDE_18_DEPTH)

    # Эскиз37 → Вырез-Вытянуть11 (cut)
    with BuildSketch(Plane.XY.offset(2.4)):
        with Locations((5, -5)):
            Circle(SKETCH_37_R)
        with Locations((54, -5)):
            Circle(SKETCH_37_R)
        with Locations((54, -75)):
            Circle(SKETCH_37_R)
        with Locations((5, -75)):
            Circle(SKETCH_37_R)
    extrude(amount=-CUT_EXTRUDE_11_DEPTH, mode=Mode.SUBTRACT)


with BuildPart() as body_2_2_1:
    add(body_2_2.part)

    # Вырез-Вытянуть6: cut by cut_extrude_6_tool
    add(cut_extrude_6_tool.part, mode=Mode.SUBTRACT)


with BuildPart() as body_3_1:
    add(body_3.part)

    # Вырез-Вытянуть6: cut by cut_extrude_6_tool
    add(cut_extrude_6_tool.part, mode=Mode.SUBTRACT)


with BuildPart() as body_4_1:
    add(body_4.part)

    # Вырез-Вытянуть6: cut by cut_extrude_6_tool
    add(cut_extrude_6_tool.part, mode=Mode.SUBTRACT)


with BuildPart() as body_5_1:
    add(body_5.part)

    # Вырез-Вытянуть6: cut by cut_extrude_6_tool
    add(cut_extrude_6_tool.part, mode=Mode.SUBTRACT)


with BuildPart() as body_6_1:
    add(body_6.part)

    # Вырез-Вытянуть6: cut by cut_extrude_6_tool
    add(cut_extrude_6_tool.part, mode=Mode.SUBTRACT)


with BuildPart() as body_7_1:
    add(body_7.part)

    # Вырез-Вытянуть6: cut by cut_extrude_6_tool
    add(cut_extrude_6_tool.part, mode=Mode.SUBTRACT)


solid = body_2_3.part
